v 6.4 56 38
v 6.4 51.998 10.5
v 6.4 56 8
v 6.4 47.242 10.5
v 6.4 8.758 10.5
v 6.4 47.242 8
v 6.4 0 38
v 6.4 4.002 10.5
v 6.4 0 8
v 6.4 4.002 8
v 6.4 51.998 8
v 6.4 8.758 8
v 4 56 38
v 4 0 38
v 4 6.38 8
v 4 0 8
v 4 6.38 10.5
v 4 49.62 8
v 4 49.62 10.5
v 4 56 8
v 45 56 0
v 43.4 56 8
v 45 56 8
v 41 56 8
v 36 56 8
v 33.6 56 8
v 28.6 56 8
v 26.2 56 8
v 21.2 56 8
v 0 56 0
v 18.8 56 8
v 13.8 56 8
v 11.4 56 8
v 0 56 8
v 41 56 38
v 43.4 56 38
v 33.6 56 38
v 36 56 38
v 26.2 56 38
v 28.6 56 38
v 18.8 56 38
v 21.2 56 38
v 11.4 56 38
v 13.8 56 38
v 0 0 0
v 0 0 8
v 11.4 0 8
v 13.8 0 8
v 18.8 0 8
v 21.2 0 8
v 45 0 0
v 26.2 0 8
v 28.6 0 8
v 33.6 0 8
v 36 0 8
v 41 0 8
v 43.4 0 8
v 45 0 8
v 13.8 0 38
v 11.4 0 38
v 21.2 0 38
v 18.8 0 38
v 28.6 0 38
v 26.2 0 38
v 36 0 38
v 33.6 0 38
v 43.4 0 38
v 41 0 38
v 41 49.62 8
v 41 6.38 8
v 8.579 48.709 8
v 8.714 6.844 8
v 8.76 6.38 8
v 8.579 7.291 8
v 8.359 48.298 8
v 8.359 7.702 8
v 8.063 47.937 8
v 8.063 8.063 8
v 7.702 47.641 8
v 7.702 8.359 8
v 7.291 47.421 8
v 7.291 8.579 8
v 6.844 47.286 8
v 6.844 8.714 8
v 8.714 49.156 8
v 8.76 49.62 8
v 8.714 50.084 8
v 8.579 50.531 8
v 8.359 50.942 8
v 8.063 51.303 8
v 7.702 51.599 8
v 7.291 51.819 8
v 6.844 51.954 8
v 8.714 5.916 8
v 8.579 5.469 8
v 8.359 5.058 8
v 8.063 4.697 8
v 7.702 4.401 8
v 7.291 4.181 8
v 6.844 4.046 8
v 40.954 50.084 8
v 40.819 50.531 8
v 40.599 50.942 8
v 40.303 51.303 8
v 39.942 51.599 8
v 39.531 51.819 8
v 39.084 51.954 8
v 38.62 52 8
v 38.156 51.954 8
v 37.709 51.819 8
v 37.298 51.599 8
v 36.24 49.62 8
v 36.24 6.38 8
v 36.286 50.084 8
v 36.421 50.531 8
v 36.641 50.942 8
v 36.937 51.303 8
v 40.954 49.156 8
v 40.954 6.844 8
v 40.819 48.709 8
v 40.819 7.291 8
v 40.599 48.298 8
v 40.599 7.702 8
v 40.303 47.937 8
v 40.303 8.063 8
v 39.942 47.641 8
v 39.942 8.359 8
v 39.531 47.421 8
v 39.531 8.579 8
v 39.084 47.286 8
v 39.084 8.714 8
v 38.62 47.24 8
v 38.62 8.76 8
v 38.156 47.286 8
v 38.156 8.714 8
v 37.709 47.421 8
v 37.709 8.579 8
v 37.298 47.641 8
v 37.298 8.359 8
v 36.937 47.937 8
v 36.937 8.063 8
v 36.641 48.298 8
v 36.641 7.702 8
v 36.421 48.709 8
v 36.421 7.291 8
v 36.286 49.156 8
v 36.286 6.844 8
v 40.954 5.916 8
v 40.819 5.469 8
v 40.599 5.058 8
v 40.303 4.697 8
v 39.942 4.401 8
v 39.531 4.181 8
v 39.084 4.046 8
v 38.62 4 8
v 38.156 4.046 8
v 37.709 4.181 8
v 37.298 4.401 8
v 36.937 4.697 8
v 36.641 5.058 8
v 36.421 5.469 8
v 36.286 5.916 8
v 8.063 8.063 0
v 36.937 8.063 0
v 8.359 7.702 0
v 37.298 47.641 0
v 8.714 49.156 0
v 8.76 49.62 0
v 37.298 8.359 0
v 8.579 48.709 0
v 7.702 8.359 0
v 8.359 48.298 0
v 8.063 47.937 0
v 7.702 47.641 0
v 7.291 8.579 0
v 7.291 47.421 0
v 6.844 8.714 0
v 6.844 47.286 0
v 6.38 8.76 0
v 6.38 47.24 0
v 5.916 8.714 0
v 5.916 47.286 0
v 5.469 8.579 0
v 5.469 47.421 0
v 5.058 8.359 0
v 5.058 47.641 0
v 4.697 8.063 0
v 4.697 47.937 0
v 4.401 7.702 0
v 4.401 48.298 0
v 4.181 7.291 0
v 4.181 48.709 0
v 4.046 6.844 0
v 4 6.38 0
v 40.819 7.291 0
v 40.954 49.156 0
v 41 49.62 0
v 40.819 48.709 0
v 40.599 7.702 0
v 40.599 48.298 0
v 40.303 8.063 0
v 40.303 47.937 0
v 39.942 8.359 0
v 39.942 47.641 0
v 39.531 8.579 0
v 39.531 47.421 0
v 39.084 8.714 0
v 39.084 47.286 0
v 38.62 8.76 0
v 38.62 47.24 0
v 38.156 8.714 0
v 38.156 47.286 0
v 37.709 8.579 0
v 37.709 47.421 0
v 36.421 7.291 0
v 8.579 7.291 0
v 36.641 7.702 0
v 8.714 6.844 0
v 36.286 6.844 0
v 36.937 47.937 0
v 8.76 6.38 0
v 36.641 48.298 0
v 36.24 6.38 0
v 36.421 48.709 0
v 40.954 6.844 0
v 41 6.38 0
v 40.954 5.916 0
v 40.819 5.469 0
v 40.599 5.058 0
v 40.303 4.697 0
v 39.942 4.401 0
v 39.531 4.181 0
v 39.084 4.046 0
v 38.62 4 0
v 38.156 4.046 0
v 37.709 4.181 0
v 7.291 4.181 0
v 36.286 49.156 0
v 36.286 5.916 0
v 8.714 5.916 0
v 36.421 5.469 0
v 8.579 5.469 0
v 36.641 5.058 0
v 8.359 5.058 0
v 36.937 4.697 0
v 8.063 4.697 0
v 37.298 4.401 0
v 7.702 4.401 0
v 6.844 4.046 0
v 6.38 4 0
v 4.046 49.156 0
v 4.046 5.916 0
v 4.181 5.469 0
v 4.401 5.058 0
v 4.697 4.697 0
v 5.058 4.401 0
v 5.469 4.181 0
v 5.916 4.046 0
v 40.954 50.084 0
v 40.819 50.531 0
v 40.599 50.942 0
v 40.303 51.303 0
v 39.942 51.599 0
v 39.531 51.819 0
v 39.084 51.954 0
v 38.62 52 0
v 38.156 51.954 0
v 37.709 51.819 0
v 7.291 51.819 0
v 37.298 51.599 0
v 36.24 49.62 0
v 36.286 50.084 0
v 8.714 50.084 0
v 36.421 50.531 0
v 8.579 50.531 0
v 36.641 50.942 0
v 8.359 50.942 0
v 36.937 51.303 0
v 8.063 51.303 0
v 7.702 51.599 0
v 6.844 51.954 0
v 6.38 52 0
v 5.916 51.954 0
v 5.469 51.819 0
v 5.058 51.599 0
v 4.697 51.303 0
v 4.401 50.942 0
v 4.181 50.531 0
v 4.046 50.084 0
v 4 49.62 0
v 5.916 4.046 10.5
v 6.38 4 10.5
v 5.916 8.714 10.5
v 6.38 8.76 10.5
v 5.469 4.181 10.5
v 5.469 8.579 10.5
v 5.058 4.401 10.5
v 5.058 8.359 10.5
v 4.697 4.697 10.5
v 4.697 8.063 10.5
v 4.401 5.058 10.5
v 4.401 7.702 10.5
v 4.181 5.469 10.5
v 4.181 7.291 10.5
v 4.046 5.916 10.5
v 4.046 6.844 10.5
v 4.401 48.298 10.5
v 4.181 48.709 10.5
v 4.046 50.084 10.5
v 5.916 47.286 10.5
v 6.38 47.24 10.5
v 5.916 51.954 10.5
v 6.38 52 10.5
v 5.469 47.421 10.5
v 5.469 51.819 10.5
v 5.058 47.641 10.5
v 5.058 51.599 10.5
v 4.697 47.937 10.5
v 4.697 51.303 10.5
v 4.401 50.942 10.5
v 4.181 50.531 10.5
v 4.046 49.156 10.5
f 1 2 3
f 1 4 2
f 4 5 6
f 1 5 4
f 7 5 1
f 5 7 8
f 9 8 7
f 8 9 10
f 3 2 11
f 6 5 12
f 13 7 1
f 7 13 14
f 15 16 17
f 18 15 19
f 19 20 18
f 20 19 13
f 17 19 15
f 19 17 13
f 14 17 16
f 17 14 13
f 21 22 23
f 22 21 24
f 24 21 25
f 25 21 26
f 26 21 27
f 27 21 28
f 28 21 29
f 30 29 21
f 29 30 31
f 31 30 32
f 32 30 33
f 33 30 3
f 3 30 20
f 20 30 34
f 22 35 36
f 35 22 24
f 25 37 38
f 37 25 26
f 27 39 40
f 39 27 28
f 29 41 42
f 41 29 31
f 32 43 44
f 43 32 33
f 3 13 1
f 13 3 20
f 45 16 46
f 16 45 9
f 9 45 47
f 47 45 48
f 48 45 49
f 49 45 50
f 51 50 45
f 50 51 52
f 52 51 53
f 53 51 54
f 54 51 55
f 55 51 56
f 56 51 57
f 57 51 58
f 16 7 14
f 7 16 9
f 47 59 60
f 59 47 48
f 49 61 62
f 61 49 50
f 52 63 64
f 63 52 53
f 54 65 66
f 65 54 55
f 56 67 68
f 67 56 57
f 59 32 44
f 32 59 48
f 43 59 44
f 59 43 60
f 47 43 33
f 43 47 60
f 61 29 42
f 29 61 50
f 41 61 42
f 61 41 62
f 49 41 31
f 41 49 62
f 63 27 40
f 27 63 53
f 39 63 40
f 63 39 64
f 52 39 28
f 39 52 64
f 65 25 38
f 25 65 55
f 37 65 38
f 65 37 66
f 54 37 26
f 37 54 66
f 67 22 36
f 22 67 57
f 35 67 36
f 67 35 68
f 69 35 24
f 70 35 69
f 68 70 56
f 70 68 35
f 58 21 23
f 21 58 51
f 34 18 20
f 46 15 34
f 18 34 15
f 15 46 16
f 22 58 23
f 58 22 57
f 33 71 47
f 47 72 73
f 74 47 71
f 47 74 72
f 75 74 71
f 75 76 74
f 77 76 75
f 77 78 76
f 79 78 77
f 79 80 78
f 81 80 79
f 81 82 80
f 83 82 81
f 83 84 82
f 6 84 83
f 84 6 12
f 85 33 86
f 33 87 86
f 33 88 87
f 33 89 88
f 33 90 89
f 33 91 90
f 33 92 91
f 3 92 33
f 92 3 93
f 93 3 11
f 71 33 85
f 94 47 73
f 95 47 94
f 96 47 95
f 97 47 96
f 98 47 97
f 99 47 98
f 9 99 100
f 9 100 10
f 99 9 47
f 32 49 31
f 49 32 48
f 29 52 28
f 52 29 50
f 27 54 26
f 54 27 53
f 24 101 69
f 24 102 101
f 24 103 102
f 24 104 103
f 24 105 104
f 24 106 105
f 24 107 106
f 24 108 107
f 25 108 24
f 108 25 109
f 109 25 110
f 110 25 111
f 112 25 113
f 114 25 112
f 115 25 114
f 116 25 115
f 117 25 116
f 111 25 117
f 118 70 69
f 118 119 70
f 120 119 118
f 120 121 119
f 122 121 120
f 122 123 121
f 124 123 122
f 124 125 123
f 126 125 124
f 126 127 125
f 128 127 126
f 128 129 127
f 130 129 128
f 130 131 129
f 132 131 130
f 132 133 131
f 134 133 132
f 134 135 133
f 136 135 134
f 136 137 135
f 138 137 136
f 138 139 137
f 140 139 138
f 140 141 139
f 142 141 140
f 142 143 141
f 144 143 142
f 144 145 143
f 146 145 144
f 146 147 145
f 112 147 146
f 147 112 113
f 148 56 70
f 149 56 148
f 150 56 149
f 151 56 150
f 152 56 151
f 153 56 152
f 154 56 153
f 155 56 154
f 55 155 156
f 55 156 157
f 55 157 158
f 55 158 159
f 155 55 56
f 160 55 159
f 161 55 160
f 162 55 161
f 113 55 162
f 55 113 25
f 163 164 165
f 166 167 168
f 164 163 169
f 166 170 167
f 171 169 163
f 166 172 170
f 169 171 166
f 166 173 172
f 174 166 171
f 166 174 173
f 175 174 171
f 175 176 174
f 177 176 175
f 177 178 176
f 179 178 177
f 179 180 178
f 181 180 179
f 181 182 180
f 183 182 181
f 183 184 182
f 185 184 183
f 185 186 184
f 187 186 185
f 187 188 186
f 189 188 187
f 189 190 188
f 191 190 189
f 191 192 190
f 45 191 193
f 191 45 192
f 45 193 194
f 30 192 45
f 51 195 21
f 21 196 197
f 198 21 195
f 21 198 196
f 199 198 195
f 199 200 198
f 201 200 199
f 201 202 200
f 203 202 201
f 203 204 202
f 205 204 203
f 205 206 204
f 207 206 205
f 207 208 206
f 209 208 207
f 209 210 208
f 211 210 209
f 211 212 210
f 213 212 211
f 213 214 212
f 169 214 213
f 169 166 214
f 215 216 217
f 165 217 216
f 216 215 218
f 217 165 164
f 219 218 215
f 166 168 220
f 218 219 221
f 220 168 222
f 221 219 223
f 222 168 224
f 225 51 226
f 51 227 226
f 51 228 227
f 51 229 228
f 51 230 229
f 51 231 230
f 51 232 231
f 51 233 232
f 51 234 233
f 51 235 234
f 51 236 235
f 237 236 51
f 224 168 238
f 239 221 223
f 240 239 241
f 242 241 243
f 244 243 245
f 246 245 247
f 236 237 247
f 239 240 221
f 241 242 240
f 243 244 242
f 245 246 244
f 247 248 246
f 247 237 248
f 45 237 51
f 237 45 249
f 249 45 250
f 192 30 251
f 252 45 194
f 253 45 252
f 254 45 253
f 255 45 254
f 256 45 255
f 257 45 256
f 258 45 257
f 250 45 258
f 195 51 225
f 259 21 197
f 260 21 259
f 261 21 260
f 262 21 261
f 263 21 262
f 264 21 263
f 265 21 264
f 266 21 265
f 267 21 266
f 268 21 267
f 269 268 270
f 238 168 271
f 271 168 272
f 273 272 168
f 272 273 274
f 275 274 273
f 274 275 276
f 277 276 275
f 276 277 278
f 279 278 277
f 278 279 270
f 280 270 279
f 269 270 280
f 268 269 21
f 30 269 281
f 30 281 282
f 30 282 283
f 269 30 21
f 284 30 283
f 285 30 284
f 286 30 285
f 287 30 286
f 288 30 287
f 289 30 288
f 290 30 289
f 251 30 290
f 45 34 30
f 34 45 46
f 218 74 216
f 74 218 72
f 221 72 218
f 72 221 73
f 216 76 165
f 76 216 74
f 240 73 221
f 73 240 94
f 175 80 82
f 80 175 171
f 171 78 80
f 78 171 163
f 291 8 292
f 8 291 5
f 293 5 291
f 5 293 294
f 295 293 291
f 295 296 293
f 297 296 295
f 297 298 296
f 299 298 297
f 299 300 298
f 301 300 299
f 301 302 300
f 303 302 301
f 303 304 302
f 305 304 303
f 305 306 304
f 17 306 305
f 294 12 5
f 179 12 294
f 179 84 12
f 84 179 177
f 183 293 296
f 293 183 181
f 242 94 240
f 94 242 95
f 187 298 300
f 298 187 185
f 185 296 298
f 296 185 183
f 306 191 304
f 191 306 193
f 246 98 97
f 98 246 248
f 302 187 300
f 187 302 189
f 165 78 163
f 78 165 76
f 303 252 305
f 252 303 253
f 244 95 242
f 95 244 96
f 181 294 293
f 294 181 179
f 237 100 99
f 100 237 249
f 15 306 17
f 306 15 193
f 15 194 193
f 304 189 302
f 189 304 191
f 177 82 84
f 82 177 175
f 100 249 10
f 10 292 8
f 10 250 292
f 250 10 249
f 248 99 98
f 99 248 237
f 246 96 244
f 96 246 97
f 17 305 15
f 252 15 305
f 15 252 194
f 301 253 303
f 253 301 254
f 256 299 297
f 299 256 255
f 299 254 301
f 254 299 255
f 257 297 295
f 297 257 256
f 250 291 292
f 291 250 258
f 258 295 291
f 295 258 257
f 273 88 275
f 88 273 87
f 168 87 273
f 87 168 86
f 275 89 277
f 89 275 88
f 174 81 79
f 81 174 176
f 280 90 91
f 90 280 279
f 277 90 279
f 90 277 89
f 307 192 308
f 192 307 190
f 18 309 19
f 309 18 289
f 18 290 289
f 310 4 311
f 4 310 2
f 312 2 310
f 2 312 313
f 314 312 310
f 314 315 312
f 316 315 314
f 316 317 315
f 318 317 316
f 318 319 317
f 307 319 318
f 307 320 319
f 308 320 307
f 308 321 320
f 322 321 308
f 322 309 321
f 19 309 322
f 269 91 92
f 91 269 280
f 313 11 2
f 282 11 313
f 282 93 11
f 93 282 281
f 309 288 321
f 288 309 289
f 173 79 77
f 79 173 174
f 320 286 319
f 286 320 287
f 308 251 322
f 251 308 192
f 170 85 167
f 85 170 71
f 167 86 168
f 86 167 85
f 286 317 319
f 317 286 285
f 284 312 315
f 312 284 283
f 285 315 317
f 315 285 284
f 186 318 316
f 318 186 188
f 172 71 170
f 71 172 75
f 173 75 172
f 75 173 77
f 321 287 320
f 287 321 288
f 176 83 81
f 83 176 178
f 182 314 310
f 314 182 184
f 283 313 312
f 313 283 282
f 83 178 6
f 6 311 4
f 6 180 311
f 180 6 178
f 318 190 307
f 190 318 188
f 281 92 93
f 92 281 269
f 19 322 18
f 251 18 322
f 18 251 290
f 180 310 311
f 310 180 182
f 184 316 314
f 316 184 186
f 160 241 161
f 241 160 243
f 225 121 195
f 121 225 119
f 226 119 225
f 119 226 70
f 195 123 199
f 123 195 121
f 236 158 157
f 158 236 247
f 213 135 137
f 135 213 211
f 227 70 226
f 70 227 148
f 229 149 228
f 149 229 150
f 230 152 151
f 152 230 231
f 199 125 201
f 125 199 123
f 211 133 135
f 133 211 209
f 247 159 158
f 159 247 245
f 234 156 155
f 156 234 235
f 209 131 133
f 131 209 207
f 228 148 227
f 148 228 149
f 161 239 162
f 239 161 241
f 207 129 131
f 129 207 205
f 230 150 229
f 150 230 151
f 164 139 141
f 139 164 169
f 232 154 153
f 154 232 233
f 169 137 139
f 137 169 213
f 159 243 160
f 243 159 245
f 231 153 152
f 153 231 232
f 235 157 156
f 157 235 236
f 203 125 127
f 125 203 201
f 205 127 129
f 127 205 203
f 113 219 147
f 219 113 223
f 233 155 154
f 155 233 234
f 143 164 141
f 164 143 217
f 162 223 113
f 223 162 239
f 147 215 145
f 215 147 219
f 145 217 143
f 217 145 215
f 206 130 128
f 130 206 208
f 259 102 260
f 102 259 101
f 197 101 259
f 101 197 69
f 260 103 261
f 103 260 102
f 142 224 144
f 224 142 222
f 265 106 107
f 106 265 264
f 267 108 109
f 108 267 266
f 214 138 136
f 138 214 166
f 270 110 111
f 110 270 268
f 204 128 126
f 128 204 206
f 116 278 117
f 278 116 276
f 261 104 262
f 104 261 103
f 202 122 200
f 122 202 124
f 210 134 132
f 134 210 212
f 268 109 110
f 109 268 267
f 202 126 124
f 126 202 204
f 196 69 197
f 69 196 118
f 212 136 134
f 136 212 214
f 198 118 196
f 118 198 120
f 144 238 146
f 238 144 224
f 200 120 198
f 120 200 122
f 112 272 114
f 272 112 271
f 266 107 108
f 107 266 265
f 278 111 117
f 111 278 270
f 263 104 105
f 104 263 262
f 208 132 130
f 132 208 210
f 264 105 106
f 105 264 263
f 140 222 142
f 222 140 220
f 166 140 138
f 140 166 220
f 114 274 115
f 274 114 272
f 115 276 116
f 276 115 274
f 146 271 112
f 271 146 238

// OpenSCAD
$fn = 32;

// ----------------------------------------------------------------------
// Finned heat sink: 45 x 56 mm base, 30 mm fins
// ----------------------------------------------------------------------

// --- parameters (mm) ---
base_w = 45;              // base width
base_d = 56;              // base depth
base_t = 8;               // base thickness
fin_h = 30;               // fin height above the base
holes_d = 4.76;           // fixing holes
hole_x = 16.12;           // hole offset in x
hole_y = 21.62;           // hole offset in y
fin_t = 2.4;              // fin thickness
fin_pitch = 7.4;          // fin pitch
fin_count = 6;            // number of fins
fin_x0 = 4;               // first fin offset

difference() {
  union() {
    cube([base_w, base_d, base_t]);
    for (i = [0 : fin_count - 1]) {
      translate([fin_x0 + i * fin_pitch, 0, base_t - 0.5]) cube([fin_t, base_d, fin_h + 0.5]);
    }
  }
  /* fixing holes through the base, 2.5 mm clear on both sides */
  for (hx = [-16.12, 16.12]) {
    for (hy = [-21.62, 21.62]) {
      translate([base_w / 2 + hx, base_d / 2 + hy, -2.5]) cylinder(h = base_t + 5, d = holes_d);
    }
  }
}
